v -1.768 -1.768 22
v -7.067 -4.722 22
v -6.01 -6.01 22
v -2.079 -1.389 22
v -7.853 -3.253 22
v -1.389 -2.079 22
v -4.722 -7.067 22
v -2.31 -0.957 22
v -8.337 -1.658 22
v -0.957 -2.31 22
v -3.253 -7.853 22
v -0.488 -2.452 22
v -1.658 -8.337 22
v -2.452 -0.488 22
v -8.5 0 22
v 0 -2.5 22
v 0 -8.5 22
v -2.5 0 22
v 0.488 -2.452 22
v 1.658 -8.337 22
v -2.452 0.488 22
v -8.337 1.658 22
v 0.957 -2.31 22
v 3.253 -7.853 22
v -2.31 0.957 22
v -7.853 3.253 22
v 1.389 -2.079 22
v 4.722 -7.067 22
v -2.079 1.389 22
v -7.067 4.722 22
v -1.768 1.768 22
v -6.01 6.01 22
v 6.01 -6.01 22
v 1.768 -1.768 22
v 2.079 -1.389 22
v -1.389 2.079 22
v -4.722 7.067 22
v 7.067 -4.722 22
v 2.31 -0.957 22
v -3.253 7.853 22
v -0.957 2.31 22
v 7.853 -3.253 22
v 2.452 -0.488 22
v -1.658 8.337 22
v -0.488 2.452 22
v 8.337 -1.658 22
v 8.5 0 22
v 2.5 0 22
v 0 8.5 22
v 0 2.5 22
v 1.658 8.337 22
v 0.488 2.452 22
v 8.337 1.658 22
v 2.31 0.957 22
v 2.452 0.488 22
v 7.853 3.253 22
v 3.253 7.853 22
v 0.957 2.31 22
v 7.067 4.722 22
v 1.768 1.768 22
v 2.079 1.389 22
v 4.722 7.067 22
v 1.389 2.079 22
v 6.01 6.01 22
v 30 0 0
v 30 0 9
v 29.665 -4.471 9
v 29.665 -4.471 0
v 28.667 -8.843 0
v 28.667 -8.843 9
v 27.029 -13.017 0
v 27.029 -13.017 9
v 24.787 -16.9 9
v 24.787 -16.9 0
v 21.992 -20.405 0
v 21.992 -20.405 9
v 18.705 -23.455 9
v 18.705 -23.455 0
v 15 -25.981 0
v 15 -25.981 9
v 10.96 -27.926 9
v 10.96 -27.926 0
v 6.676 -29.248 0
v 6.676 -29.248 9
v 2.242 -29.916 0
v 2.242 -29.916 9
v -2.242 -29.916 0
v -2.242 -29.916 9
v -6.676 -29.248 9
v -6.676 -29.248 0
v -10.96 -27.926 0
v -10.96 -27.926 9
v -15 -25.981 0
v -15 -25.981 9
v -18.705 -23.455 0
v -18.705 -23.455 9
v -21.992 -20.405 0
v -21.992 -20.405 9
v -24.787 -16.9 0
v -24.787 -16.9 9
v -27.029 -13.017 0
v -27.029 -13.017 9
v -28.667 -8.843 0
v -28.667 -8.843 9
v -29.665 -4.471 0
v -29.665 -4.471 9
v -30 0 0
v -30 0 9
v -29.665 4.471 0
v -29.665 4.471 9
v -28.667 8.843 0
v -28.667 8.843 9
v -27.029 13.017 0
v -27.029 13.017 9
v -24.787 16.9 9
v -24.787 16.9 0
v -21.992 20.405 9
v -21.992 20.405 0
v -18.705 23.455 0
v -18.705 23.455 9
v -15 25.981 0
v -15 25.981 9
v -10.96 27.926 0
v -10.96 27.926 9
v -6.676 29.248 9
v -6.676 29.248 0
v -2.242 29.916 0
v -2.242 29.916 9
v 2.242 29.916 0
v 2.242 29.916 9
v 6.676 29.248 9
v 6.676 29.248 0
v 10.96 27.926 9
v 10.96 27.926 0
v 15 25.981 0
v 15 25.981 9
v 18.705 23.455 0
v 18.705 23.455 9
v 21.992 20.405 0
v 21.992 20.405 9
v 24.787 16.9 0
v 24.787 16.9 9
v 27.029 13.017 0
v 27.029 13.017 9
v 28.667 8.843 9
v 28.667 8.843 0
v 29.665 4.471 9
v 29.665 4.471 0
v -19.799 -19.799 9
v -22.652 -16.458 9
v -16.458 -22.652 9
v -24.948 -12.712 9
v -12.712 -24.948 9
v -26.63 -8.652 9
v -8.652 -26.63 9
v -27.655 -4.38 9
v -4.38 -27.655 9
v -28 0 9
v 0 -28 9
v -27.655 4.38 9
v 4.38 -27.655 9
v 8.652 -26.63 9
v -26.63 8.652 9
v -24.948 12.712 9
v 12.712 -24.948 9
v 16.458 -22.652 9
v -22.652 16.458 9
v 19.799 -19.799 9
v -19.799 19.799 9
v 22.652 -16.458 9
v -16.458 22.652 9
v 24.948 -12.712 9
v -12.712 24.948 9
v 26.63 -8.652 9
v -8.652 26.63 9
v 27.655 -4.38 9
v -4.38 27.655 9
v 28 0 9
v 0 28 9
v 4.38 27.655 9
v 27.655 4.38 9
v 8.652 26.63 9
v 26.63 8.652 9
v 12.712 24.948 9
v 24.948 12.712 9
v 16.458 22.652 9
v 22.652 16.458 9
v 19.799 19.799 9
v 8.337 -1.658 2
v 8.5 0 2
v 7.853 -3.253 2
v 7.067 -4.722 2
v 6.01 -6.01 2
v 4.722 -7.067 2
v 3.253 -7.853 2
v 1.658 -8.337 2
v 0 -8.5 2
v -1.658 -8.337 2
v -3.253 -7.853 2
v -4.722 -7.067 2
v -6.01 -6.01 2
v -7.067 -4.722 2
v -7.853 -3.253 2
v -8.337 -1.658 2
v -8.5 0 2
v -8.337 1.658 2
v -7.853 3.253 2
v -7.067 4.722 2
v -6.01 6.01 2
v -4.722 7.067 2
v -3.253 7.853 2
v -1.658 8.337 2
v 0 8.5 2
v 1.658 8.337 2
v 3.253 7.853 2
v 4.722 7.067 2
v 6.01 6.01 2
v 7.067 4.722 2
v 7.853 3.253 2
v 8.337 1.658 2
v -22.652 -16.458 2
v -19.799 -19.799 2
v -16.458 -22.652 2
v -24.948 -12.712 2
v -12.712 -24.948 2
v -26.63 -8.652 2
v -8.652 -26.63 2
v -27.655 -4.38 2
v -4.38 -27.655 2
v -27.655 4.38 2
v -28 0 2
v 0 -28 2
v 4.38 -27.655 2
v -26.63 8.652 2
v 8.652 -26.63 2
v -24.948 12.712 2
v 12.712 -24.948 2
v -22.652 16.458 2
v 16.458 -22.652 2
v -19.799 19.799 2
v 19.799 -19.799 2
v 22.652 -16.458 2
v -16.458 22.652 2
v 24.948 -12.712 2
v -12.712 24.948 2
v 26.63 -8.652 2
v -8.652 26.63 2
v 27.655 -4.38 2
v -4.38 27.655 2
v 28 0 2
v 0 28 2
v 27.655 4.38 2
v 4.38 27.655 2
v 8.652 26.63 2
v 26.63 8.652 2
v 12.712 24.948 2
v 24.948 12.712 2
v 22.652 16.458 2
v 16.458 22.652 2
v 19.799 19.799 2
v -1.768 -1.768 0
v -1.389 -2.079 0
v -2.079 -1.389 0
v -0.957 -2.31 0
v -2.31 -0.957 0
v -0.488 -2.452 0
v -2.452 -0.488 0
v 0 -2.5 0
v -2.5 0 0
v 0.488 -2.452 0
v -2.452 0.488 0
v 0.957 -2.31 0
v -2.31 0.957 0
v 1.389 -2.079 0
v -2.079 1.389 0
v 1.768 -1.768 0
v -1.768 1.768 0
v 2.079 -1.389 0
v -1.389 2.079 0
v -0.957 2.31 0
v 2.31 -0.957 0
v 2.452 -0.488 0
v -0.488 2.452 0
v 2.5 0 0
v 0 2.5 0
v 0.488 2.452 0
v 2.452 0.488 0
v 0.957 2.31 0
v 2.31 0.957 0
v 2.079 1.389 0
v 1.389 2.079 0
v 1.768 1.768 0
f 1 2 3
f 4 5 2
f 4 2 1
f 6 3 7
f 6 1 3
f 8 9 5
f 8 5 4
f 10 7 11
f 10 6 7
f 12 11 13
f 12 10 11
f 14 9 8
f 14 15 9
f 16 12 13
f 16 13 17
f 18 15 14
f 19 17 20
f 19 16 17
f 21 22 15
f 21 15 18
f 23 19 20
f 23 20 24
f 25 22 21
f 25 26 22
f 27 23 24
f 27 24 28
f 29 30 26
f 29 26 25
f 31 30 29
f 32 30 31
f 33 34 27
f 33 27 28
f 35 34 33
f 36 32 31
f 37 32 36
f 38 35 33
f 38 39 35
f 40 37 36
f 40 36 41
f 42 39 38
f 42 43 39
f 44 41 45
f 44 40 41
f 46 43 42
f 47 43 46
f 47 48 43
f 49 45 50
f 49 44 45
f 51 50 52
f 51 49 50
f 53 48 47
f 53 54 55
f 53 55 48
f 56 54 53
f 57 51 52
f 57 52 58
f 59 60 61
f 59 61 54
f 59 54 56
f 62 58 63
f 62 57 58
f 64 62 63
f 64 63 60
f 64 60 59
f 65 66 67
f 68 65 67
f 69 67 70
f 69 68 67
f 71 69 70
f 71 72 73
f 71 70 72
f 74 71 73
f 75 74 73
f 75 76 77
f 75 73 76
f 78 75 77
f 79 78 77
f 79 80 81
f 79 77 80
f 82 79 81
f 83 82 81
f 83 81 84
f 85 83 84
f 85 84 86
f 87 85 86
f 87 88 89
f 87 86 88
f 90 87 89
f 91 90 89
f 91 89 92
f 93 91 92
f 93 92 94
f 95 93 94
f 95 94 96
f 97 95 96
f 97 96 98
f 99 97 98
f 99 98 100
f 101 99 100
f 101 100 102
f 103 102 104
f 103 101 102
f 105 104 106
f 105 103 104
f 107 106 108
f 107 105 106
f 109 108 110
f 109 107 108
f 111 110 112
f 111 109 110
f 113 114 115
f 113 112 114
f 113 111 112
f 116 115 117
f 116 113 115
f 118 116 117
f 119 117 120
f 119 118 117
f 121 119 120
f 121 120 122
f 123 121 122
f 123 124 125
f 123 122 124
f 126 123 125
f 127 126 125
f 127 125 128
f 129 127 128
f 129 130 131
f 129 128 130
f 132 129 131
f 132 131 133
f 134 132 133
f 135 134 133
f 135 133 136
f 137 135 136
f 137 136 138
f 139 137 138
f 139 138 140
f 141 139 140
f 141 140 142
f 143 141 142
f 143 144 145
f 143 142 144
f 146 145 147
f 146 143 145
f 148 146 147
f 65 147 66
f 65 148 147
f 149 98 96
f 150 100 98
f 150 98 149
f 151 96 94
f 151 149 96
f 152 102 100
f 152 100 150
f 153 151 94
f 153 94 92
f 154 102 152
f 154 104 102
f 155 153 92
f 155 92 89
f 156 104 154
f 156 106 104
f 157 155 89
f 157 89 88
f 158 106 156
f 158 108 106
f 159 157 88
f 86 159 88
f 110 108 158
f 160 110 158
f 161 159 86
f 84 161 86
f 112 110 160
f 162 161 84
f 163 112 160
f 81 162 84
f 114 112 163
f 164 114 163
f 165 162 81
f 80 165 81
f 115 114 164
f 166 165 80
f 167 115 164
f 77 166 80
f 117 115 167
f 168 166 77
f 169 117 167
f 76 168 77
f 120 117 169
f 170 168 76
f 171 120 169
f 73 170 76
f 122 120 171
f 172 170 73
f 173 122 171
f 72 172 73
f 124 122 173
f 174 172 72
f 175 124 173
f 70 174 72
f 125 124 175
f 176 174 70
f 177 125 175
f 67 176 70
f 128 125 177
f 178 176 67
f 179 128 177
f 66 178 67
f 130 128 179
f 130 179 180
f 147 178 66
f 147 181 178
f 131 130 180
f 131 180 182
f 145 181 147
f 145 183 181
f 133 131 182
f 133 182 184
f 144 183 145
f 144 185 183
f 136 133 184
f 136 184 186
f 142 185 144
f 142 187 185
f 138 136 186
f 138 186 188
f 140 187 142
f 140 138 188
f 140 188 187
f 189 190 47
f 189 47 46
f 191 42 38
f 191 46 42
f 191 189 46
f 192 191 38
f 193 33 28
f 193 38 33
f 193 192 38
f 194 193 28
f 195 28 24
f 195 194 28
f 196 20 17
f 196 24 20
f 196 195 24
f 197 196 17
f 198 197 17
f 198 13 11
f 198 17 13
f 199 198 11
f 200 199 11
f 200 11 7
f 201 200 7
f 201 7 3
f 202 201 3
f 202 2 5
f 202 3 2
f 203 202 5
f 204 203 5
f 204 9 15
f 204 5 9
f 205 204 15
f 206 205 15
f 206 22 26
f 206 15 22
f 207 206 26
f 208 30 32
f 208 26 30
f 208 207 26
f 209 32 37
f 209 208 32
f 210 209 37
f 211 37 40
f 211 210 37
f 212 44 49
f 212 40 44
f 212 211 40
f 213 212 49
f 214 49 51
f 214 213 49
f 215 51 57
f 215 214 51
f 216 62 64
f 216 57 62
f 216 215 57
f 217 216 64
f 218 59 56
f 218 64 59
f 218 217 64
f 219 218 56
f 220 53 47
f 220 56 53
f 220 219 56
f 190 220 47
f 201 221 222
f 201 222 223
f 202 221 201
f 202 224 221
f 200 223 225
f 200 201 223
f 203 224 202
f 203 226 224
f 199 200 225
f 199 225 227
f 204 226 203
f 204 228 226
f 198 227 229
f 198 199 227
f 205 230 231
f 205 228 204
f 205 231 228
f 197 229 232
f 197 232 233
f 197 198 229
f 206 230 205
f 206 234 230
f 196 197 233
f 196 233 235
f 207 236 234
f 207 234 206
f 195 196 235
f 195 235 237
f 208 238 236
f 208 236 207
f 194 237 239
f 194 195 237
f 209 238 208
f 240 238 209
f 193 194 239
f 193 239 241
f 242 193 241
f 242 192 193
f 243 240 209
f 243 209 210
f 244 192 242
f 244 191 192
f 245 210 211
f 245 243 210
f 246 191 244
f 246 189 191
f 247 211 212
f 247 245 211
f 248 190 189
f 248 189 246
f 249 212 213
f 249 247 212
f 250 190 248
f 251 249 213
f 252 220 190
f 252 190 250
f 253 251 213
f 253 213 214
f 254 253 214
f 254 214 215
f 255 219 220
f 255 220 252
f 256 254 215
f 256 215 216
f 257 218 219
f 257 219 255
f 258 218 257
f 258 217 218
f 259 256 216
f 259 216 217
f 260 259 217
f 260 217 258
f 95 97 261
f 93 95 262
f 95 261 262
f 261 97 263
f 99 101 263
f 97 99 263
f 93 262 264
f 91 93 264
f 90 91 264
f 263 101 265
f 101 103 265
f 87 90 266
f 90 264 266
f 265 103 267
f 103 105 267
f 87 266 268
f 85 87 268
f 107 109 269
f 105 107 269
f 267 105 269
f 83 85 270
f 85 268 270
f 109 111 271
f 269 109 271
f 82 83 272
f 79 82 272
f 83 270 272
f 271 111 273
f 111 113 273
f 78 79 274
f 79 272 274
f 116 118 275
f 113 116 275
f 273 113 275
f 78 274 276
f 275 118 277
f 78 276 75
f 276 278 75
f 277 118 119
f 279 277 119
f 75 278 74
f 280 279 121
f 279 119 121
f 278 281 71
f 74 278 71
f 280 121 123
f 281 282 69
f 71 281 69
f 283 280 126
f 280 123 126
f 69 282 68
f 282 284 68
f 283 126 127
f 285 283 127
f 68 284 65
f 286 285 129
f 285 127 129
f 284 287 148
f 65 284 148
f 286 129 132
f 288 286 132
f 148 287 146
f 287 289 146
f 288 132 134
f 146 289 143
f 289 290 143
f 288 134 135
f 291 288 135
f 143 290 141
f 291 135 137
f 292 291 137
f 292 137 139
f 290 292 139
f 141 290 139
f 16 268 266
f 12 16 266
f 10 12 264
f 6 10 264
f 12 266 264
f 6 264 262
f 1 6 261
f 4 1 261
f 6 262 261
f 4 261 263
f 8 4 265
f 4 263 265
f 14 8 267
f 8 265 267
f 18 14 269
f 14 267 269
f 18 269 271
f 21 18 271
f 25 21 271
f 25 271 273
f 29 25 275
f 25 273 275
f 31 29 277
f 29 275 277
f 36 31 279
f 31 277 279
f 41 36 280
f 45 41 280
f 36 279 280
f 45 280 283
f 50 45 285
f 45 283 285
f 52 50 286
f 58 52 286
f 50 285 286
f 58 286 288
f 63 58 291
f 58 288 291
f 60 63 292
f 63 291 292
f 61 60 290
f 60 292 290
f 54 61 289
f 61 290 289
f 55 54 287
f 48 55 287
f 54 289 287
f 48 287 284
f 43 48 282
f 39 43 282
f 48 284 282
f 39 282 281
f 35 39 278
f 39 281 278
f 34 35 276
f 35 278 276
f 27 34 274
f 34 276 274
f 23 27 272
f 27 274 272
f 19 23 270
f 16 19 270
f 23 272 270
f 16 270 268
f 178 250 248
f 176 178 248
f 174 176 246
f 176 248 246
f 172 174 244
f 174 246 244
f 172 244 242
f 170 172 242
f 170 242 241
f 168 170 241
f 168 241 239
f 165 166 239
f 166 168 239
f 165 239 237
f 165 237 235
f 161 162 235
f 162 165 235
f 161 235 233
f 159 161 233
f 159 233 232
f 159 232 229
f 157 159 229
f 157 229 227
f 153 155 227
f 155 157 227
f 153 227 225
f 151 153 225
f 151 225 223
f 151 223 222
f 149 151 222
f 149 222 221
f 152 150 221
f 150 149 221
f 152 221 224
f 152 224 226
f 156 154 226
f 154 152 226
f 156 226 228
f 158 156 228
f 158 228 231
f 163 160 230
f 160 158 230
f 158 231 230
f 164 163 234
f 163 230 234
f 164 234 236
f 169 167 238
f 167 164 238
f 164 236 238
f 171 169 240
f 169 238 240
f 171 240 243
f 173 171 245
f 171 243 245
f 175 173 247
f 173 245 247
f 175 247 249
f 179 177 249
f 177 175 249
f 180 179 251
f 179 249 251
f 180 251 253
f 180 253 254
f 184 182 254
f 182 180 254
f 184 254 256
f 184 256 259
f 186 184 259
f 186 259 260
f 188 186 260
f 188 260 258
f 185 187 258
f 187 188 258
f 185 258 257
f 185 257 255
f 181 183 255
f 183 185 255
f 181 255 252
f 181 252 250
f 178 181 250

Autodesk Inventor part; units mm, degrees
ref_plane "YZ Plane" through (0, 0, 0) normal (1, 0, 0) x (0, 1, 0)
ref_plane "XZ Plane" through (0, 0, 0) normal (0, 1, 0) x (-1, 0, 0)
ref_plane "XY Plane" through (0, 0, 0) normal (0, 0, 1) x (1, 0, 0)
sketch "スケッチ1" plane through (0, 0, 0) normal (0, 0, 1) x (1, 0, 0)
  circle A0 centre (0, 0) radius 30
  dimension "d0" = 60
extrude "押し出し1" add sketch "スケッチ1" along normal blind 2
sketch "スケッチ2" plane through (0, 0, 2) normal (0, 0, 1) x (1, 0, 0)
  circle A0 centre (0, 0) radius 8.5
  dimension "d3" = 17
extrude "押し出し2" add sketch "スケッチ2" along normal blind 20
sketch "スケッチ3" plane through (0, 0, 22) normal (0, 0, 1) x (1, 0, 0)
  point P0 (0, 0)
hole "穴1" at (0, 0, 22) direction (0, 0, -1) diameter 5 end through all
sketch "スケッチ4" plane through (0, 0, 2) normal (0, 0, 1) x (1, 0, 0)
  circle A0 centre (0, 0) radius 30 projected
  circle A1 centre (0, 0) radius 30
  circle A2 centre (0, 0) radius 8.5 projected
  circle A3 centre (0, 0) radius 28
  dimension "d13" = 2
extrude "押し出し3" add sketch "スケッチ4" along normal blind 7 contours A0
properties part number "wheel" material "アルミニウム 6061"
